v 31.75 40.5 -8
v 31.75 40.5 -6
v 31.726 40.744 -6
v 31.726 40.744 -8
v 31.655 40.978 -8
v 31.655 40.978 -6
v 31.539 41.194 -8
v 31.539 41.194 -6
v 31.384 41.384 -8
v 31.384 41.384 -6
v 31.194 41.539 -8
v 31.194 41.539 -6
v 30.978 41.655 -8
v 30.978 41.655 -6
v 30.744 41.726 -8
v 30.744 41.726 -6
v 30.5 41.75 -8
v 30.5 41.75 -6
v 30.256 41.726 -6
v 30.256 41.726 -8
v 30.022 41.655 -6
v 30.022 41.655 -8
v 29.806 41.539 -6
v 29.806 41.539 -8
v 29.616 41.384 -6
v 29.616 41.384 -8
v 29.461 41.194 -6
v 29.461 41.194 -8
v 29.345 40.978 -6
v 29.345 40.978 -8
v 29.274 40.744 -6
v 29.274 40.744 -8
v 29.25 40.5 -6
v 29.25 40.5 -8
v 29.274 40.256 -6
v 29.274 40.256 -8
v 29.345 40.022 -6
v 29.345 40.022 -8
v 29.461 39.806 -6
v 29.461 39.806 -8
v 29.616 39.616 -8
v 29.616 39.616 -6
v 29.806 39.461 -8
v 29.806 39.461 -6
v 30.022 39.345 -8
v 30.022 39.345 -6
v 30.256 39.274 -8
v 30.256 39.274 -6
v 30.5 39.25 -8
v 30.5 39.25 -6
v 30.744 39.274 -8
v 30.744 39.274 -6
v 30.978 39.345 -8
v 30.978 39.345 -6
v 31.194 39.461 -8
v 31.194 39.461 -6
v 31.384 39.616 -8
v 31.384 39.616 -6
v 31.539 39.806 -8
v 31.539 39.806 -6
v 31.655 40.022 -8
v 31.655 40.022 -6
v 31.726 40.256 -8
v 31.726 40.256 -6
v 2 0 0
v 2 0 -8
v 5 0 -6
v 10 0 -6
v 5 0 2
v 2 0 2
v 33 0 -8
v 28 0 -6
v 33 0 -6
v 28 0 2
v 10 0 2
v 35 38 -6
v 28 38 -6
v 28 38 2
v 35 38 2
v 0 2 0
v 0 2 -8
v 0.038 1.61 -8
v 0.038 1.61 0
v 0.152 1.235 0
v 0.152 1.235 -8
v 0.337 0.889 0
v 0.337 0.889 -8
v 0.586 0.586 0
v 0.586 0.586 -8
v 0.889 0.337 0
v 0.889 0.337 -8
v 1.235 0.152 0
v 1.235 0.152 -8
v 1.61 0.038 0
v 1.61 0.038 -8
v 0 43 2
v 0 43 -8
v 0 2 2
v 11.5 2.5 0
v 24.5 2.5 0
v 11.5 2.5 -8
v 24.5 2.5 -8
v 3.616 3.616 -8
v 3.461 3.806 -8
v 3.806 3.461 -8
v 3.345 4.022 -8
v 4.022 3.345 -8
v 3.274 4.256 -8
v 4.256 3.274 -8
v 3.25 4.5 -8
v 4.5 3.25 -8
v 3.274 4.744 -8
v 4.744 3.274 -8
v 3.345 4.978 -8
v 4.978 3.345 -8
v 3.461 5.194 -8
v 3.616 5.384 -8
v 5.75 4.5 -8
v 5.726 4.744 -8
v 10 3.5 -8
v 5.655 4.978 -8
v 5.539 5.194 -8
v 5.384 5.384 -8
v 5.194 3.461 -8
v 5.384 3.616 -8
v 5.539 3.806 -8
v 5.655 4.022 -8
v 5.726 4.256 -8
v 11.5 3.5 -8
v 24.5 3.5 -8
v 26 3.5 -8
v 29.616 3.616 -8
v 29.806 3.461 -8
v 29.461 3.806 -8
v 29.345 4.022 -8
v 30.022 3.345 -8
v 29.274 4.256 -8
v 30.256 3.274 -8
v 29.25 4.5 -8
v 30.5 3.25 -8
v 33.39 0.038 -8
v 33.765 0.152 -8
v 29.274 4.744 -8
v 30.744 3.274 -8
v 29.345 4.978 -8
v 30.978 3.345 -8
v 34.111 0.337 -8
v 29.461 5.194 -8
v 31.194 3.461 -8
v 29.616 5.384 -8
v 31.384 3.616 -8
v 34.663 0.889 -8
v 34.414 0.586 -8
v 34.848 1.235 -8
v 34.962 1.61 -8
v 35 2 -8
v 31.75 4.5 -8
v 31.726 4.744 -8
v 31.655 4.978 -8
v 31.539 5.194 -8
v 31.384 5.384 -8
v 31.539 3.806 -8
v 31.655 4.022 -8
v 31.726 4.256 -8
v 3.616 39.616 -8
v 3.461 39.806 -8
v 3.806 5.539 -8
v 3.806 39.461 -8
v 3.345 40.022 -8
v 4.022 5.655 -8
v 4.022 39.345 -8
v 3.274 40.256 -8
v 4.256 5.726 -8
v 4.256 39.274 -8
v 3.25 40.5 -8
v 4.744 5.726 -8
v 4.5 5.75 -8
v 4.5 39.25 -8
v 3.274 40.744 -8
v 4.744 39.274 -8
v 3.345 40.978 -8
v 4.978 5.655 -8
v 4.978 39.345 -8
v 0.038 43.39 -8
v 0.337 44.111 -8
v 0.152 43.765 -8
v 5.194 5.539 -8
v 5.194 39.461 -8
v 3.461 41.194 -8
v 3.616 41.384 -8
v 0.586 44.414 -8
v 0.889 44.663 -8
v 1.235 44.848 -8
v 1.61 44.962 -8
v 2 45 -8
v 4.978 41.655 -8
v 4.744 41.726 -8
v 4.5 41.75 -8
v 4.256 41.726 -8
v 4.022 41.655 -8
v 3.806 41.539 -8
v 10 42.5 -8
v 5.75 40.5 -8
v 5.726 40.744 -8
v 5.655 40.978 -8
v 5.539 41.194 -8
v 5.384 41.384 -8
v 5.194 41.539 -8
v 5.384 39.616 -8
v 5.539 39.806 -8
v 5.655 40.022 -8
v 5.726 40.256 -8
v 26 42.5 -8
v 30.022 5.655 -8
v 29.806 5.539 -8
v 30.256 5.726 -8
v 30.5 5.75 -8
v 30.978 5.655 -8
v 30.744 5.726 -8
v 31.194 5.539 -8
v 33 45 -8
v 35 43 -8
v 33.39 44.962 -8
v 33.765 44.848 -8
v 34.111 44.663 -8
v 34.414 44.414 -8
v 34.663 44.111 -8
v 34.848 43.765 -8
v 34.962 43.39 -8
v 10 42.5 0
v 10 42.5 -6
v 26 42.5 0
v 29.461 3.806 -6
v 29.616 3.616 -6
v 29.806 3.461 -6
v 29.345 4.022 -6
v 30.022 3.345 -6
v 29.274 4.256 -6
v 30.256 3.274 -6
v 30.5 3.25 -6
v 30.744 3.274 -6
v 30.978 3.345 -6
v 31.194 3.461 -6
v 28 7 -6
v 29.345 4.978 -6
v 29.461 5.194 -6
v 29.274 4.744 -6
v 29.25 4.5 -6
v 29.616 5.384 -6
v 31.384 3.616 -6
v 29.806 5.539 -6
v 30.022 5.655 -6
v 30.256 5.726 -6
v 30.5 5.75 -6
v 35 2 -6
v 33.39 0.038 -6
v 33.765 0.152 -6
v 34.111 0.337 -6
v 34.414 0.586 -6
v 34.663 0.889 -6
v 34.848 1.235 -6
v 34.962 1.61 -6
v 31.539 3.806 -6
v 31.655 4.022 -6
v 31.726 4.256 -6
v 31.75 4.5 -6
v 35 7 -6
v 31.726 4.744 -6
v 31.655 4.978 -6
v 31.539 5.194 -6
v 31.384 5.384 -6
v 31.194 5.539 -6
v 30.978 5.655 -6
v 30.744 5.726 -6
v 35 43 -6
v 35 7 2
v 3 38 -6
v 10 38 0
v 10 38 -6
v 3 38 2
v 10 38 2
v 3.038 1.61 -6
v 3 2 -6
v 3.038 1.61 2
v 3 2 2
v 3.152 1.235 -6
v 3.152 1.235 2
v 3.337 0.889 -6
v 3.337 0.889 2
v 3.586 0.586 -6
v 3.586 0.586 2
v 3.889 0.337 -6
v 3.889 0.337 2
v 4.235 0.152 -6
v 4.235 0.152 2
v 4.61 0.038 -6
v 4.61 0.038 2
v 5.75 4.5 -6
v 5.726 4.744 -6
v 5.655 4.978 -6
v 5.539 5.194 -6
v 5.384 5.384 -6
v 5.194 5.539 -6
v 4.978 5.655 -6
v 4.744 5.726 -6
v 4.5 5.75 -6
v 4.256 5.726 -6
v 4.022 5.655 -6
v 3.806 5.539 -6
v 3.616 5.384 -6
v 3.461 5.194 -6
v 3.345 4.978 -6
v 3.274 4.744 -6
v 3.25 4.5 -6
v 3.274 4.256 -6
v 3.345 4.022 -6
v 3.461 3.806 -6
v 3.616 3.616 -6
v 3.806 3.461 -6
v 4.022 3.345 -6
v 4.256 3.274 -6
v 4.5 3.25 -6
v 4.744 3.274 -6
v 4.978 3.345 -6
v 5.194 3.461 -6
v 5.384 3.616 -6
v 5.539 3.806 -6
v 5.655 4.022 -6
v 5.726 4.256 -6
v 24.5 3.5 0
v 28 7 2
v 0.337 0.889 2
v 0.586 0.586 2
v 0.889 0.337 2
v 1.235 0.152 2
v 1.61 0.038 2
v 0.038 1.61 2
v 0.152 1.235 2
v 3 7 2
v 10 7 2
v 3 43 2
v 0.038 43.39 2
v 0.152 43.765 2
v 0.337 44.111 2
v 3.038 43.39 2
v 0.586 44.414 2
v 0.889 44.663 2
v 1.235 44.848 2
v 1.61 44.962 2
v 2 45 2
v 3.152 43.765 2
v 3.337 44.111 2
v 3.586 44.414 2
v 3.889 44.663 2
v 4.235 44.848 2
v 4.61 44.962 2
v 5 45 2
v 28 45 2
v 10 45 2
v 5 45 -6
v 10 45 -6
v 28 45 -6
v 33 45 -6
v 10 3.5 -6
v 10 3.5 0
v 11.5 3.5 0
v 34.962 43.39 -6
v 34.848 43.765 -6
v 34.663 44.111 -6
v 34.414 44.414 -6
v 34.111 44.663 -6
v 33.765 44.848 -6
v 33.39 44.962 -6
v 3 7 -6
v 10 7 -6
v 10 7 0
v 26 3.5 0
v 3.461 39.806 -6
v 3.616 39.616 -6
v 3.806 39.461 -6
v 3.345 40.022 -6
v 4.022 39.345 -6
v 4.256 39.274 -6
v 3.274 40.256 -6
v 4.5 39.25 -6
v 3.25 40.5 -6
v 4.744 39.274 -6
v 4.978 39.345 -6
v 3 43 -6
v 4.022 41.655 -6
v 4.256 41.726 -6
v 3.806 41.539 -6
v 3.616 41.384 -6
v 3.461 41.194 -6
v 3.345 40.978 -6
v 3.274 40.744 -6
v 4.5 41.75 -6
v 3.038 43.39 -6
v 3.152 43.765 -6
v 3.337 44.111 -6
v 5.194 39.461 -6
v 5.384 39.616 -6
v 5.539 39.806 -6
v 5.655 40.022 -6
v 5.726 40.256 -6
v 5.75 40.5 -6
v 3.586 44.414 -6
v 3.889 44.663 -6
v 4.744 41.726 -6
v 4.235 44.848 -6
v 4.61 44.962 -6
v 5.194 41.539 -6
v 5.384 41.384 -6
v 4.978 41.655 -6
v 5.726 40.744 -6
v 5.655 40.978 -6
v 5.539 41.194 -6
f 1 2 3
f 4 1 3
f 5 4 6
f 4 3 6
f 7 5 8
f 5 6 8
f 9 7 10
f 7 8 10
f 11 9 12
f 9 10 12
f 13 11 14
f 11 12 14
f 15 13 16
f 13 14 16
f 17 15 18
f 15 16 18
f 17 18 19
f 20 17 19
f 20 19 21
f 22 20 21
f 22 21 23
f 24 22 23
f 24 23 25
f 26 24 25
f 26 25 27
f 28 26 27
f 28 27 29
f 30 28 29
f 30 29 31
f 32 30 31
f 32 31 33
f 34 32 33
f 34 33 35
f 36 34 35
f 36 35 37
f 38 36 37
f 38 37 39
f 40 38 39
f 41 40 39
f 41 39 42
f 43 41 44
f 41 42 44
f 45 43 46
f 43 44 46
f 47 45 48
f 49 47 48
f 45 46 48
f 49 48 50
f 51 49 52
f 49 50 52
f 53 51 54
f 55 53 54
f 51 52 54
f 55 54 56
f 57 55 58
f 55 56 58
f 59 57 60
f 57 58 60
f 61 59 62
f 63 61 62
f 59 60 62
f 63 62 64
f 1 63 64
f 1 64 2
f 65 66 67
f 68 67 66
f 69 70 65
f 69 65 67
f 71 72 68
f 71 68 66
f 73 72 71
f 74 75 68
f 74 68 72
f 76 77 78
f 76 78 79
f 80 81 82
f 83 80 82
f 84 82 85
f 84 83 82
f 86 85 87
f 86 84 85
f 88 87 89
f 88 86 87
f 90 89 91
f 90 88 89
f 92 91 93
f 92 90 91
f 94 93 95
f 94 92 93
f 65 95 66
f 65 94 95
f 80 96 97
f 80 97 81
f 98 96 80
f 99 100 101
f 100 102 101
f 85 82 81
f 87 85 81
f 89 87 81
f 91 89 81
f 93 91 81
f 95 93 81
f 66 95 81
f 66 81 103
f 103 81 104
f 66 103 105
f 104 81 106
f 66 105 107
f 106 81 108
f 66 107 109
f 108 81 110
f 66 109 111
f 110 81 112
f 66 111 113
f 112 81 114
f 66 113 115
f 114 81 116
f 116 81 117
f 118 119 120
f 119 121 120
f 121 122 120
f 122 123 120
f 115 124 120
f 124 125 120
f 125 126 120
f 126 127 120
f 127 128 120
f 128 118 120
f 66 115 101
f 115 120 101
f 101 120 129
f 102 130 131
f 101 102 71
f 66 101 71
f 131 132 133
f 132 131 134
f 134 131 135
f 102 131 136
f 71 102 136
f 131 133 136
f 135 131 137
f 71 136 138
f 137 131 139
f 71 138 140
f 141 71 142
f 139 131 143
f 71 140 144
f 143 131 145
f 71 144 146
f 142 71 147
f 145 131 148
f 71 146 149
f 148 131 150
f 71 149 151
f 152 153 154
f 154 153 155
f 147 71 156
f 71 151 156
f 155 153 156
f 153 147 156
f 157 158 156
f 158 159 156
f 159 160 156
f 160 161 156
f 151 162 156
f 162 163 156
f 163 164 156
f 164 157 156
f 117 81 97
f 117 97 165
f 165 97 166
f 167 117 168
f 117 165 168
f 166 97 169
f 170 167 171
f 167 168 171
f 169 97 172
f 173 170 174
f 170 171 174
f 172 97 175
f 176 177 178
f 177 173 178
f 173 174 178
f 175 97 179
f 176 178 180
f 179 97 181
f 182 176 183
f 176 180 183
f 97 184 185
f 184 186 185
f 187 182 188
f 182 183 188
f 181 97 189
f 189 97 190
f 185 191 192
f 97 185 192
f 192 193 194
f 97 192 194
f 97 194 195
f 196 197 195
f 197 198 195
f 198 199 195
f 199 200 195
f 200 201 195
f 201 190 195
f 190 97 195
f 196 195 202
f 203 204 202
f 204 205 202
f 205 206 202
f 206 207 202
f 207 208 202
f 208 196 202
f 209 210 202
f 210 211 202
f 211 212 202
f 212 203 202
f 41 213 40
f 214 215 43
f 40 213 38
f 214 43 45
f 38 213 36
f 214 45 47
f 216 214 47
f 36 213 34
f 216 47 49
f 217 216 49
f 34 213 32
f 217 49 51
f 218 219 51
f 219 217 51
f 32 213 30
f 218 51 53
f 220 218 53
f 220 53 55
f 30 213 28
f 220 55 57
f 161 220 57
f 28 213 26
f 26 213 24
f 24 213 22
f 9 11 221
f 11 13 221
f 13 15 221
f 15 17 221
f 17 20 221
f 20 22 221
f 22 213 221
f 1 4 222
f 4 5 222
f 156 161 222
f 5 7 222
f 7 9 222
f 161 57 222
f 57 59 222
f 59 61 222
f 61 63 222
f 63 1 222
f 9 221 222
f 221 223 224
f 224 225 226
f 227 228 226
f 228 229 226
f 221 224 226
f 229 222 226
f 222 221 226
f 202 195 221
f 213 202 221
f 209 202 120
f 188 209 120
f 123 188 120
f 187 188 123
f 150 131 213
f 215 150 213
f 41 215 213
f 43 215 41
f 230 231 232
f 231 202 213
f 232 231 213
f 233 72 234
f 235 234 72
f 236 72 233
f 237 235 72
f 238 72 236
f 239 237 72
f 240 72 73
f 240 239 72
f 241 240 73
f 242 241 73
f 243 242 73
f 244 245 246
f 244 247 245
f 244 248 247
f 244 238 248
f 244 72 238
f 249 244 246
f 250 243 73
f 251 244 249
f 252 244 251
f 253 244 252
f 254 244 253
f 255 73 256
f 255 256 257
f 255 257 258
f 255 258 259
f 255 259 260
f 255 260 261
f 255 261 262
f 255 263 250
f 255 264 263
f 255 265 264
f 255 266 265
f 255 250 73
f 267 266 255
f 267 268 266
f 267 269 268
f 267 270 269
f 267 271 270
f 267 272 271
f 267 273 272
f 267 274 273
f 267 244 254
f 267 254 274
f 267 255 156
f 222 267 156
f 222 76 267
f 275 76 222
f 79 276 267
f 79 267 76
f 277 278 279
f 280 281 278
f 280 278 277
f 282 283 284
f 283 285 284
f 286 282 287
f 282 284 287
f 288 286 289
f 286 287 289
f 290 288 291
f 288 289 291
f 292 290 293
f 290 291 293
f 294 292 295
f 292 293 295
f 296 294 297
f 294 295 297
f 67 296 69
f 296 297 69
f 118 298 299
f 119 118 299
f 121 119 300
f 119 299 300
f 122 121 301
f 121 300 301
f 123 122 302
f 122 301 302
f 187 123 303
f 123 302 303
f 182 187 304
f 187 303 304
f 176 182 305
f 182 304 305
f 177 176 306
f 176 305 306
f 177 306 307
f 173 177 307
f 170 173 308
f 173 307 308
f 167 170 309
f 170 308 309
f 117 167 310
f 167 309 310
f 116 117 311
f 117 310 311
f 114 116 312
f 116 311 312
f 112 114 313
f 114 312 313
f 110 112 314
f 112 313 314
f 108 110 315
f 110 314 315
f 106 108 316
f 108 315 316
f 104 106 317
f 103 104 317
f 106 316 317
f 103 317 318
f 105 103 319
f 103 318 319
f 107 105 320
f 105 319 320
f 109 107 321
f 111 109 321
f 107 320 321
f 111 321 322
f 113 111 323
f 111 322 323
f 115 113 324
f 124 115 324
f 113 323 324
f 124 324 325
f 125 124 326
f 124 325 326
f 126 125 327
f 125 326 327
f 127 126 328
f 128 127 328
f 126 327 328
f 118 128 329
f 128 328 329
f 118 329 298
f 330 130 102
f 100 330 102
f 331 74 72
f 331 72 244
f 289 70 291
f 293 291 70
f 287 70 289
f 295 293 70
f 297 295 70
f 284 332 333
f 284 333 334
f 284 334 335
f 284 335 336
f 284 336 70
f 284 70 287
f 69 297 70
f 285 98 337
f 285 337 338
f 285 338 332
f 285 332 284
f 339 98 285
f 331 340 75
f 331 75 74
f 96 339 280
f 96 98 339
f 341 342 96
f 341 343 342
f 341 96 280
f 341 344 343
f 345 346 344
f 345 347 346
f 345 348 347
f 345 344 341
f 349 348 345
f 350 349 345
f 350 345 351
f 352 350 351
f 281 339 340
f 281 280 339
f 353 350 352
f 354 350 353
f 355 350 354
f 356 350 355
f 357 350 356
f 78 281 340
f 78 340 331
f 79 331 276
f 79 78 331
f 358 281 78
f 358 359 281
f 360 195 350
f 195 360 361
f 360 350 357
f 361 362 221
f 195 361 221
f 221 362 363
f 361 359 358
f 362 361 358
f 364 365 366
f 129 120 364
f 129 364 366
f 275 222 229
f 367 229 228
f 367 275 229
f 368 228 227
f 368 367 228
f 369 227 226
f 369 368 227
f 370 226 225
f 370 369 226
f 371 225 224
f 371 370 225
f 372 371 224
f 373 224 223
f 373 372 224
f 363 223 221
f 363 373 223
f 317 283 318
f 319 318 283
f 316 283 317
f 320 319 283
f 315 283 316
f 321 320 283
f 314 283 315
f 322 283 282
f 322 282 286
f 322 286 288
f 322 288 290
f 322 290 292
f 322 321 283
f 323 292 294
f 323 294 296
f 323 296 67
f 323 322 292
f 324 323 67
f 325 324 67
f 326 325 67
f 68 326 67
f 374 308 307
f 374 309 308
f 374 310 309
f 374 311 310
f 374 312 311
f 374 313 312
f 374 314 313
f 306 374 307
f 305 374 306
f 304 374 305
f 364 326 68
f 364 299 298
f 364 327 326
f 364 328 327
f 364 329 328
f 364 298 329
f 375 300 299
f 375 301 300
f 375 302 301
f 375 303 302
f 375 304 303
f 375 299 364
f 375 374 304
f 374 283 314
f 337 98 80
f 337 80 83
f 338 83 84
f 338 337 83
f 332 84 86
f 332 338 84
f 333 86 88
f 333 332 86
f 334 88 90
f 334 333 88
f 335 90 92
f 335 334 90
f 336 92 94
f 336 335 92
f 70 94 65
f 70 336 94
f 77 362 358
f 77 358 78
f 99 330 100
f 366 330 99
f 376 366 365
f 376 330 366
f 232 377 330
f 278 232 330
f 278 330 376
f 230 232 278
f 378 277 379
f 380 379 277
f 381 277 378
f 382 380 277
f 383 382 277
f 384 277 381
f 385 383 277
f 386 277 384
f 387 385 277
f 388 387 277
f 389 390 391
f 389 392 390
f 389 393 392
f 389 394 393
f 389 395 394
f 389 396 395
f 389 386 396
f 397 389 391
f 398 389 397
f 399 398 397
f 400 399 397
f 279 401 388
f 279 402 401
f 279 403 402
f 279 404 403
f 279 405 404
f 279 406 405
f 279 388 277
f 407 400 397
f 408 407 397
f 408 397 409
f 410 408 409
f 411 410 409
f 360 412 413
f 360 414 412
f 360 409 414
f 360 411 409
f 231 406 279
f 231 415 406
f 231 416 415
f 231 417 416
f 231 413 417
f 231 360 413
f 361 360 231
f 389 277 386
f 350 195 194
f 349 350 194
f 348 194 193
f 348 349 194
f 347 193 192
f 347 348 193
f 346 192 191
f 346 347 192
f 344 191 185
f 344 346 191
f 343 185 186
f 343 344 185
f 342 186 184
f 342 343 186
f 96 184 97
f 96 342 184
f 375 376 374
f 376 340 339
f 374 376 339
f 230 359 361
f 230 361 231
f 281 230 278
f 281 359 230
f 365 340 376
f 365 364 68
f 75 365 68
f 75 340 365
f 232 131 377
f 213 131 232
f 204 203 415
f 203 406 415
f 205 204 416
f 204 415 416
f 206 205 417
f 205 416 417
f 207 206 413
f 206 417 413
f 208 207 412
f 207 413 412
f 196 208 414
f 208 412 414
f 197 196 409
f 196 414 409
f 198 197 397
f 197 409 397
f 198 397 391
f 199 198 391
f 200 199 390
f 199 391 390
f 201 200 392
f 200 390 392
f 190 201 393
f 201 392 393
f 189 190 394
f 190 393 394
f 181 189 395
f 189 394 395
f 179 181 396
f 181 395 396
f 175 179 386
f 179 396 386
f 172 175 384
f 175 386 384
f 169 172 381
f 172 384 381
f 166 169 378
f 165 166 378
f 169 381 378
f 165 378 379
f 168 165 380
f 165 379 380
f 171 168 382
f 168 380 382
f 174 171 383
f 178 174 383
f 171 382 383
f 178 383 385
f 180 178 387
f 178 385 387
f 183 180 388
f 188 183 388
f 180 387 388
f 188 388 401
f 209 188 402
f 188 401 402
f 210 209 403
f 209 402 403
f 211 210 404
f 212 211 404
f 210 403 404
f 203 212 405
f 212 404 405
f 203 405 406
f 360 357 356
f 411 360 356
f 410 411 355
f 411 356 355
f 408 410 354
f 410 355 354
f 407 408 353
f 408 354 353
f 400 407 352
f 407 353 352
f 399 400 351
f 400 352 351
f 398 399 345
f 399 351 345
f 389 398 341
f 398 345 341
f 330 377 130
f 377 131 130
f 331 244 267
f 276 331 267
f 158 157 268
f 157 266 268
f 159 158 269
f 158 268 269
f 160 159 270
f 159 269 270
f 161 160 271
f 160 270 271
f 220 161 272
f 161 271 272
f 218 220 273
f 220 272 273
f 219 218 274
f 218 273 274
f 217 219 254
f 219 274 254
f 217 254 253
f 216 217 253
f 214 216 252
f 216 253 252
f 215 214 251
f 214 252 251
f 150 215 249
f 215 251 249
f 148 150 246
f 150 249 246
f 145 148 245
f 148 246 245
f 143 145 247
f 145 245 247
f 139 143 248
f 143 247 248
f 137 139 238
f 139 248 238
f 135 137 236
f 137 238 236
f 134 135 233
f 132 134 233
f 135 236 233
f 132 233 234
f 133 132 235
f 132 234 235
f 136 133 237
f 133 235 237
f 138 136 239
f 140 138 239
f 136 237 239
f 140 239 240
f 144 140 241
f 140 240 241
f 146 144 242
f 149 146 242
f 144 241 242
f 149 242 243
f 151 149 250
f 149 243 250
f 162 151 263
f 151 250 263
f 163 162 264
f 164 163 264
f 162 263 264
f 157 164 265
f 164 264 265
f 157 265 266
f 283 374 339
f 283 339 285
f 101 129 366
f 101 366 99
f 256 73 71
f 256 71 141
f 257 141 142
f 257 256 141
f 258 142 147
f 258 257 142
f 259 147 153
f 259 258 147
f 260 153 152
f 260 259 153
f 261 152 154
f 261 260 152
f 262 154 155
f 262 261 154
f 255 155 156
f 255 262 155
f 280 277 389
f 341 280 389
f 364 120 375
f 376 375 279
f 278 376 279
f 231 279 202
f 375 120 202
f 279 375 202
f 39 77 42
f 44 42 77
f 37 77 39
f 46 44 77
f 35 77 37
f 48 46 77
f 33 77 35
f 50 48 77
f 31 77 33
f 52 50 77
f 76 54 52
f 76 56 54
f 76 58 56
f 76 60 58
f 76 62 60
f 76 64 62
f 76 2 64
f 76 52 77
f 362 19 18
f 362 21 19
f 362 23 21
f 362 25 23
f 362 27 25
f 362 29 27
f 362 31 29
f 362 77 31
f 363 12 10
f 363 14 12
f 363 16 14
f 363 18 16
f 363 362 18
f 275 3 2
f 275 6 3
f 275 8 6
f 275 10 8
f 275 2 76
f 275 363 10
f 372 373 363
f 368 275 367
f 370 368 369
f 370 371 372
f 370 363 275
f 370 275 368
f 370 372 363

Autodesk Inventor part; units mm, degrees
ref_plane "YZ Plane" through (0, 0, 0) normal (1, 0, 0) x (0, 1, 0)
ref_plane "XZ Plane" through (0, 0, 0) normal (0, 1, 0) x (-1, 0, 0)
ref_plane "XY Plane" through (0, 0, 0) normal (0, 0, 1) x (1, 0, 0)
sketch "Sketch1" plane through (0, 0, 0) normal (0, 0, 1) x (1, 0, 0)
  line L0 (0, 0) -> (35, 0)
  line L1 (35, 0) -> (35, 45)
  line L2 (0, 45) -> (35, 45) construction
  circle A0 centre (4.5, 40.5) radius 1.25
  line L3 (17.5, 50) -> (17.5, 0) construction
  circle A1 centre (30.5, 40.5) radius 1.25
  line L4 (0, 45) -> (0, 0)
  line L5 (0, 22.5) -> (35, 22.5) construction
  circle A2 centre (4.5, 4.5) radius 1.25
  circle A3 centre (30.5, 4.5) radius 1.25
  line L6 (8.5, 3.5) -> (26.5, 3.5)
  line L7 (26.5, 3.5) -> (26.5, 43.5)
  line L8 (26.5, 43.5) -> (8.5, 43.5)
  line L9 (8.5, 43.5) -> (8.5, 3.5)
  line L10 (8.5, 3.5) -> (10, 3.5)
  line L11 (8.5, 4.5) -> (8.5, 3.5)
  line L12 (9.5, 4.5) -> (9.5, 43.5)
  line L13 (8.5, 4.5) -> (11, 4.5)
  line L14 (11, 4.5) -> (11, 3.5)
  line L15 (25.5, 4.5) -> (25.5, 43.5)
  line L16 (26.5, 4.5) -> (24, 4.5)
  line L17 (24, 4.5) -> (24, 3.5)
  line L18 (0, 45) -> (35, 45)
  line L19 (0, 45) -> (0, 0)
  point P0 (11, 4)
  point P1 (24, 4)
  point P2 (9.5, 4.5)
  point P3 (25.5, 4.5)
  point P4 (24, 3.5)
  dimension "d5" = 2.5
  dimension "d6" = 4.5
  dimension "d8" = 2.5
  dimension "d9" = 18
  dimension "d10" = 40
  dimension "d11" = 3.5
  dimension "d19" = 1
  dimension "d26" = 8
  dimension "d27" = 2.5
  dimension "d28" = 35
  dimension "d29" = 1.5
  dimension "d30" = 26
  dimension "d31" = 9
  dimension "d54" = 45
extrude "Extrusion1" add sketch "Sketch1" along normal blind 2 contours L4 L18 L1 L0 | L9 L13 L14 L6 | L9 L8 L12 L13 | L14 L13 L12 L8 L15 L16 L17 L6 | L17 L16 L7 L6 | L8 L7 L16 L15
extrude "Extrusion2" add sketch "Sketch1" against normal blind 8 contours L9 L13 L14 L6 | L9 L8 L12 L13 | L17 L16 L7 L6 | L8 L7 L16 L15
fillet "Fillet1" radius 2 2 edges at (26.5, 3.5, -4) (8.5, 3.5, -4)
fillet "Fillet2" radius 2 2 edges at (25.5, 43.5, -4) (9.5, 43.5, -4)
fillet "Fillet3" radius 2 4 edges at (35, 45, 1) (0, 45, 1) (0, 0, 1) (35, 0, 1)
thicken "Thicken1" operation add thickness 8 both sides no extend neighbours no toward (0, 0, -1) faces at (19.6667, 29.3453, 0)
sketch "Sketch3" plane through (33, 0, -8) normal (0, 0, -1) x (-1, 0, 0)
  line L0 (15, 49) -> (15, -1) construction
  line L1 (-2.5, 20) -> (32.5, 20) construction
  line L2 (6, 2.5) -> (24, 2.5)
  line L3 (24, 2.5) -> (24, 42.5)
  line L4 (24, 42.5) -> (6, 42.5)
  line L5 (6, 42.5) -> (6, 2.5)
  line L6 (6, 2.5) -> (7.5, 2.5)
  line L7 (6, 3.5) -> (6, 2.5)
  line L8 (7, 3.5) -> (7, 42.5)
  line L9 (6, 3.5) -> (8.5, 3.5)
  line L10 (8.5, 3.5) -> (8.5, 2.5)
  line L11 (23, 3.5) -> (23, 42.5)
  line L12 (24, 3.5) -> (21.5, 3.5)
  line L13 (21.5, 3.5) -> (21.5, 2.5)
  line L14 (31, 0) -> (0, 0) projected
  point P0 (33, 0)
  point P1 (8.5, 3)
  point P2 (21.5, 3)
  point P3 (7, 3.5)
  dimension "d36" = 18
  dimension "d37" = 40
  dimension "d38" = 1
  dimension "d39" = 8
  dimension "d40" = 2.5
  dimension "d41" = 9
  dimension "d42" = 2.5
  dimension "d43" = 7
  dimension "d44" = 8.5
extrude "Extrusion3" cut sketch "Sketch3" against normal blind 8 contours L10 L9 L8 L4 L11 L12 L13 L2
sketch "Sketch4" plane through (0, 0, 2) normal (0, 0, 1) x (1, 0, 0)
  line L0 (10, 42.5) -> (10, 3.5) projected
  line L1 (5, 45) -> (10, 45)
  line L2 (10, 45) -> (10, 38)
  line L3 (10, 38) -> (3, 38)
  line L4 (3, 38) -> (3, 43)
  line L5 (33, 45) -> (28, 45)
  line L6 (28, 45) -> (28, 38)
  line L7 (28, 38) -> (35, 38)
  line L8 (35, 38) -> (35, 43)
  arc A0 (5, 45) -> (3, 43) centre (5, 43) ccw
  arc A1 (35, 43) -> (33, 45) centre (33, 43) ccw
  line L9 (0, 0) -> (0, 45)
  line L10 (35, 2) -> (35, 43) projected
  line L11 (35, 22.5) -> (39, 22.5)
  line L12 (10, 2.5) -> (10, 41.5)
  line L13 (5, 0) -> (10, 0)
  line L14 (10, 0) -> (10, 7)
  line L15 (10, 7) -> (3, 7)
  line L16 (3, 7) -> (3, 2)
  line L17 (33, 0) -> (28, 0)
  line L18 (28, 0) -> (28, 7)
  line L19 (28, 7) -> (35, 7)
  line L20 (35, 7) -> (35, 2)
  arc A2 (3, 2) -> (5, 0) centre (5, 2) ccw
  arc A3 (33, 0) -> (35, 2) centre (33, 2) ccw
  line L21 (0, 45) -> (0, 0)
  line L22 (35, 43) -> (35, 2)
  point P0 (35, 45)
  point P1 (35, 0)
  point P2 (35, 7)
  point P3 (0, 10)
  point P4 (0, 2)
  dimension "d47" = 7
  dimension "d48" = 2
  dimension "d49" = 2
extrude "Extrusion4" cut sketch "Sketch4" against normal blind 8
sketch "Sketch6" plane through (11.5, 2.5, -8) normal (0, 1, 0) x (1, 0, 0)
  line L0 (23.5, -10) -> (16.5, -10) projected
  line L1 (14.5, 0) -> (-1.5, 0) projected
  line L2 (16.5, -10) -> (-1.5, -10)
  line L3 (-1.5, -10) -> (-1.5, 0)
  line L4 (-1.5, 0) -> (16.5, 0)
  line L5 (16.5, 0) -> (16.5, -10)
  point P0 (-11.5, -8)
  point P1 (13.5, 0)
extrude "Extrusion5" [suppressed]
properties part number "Sensor Housing"
